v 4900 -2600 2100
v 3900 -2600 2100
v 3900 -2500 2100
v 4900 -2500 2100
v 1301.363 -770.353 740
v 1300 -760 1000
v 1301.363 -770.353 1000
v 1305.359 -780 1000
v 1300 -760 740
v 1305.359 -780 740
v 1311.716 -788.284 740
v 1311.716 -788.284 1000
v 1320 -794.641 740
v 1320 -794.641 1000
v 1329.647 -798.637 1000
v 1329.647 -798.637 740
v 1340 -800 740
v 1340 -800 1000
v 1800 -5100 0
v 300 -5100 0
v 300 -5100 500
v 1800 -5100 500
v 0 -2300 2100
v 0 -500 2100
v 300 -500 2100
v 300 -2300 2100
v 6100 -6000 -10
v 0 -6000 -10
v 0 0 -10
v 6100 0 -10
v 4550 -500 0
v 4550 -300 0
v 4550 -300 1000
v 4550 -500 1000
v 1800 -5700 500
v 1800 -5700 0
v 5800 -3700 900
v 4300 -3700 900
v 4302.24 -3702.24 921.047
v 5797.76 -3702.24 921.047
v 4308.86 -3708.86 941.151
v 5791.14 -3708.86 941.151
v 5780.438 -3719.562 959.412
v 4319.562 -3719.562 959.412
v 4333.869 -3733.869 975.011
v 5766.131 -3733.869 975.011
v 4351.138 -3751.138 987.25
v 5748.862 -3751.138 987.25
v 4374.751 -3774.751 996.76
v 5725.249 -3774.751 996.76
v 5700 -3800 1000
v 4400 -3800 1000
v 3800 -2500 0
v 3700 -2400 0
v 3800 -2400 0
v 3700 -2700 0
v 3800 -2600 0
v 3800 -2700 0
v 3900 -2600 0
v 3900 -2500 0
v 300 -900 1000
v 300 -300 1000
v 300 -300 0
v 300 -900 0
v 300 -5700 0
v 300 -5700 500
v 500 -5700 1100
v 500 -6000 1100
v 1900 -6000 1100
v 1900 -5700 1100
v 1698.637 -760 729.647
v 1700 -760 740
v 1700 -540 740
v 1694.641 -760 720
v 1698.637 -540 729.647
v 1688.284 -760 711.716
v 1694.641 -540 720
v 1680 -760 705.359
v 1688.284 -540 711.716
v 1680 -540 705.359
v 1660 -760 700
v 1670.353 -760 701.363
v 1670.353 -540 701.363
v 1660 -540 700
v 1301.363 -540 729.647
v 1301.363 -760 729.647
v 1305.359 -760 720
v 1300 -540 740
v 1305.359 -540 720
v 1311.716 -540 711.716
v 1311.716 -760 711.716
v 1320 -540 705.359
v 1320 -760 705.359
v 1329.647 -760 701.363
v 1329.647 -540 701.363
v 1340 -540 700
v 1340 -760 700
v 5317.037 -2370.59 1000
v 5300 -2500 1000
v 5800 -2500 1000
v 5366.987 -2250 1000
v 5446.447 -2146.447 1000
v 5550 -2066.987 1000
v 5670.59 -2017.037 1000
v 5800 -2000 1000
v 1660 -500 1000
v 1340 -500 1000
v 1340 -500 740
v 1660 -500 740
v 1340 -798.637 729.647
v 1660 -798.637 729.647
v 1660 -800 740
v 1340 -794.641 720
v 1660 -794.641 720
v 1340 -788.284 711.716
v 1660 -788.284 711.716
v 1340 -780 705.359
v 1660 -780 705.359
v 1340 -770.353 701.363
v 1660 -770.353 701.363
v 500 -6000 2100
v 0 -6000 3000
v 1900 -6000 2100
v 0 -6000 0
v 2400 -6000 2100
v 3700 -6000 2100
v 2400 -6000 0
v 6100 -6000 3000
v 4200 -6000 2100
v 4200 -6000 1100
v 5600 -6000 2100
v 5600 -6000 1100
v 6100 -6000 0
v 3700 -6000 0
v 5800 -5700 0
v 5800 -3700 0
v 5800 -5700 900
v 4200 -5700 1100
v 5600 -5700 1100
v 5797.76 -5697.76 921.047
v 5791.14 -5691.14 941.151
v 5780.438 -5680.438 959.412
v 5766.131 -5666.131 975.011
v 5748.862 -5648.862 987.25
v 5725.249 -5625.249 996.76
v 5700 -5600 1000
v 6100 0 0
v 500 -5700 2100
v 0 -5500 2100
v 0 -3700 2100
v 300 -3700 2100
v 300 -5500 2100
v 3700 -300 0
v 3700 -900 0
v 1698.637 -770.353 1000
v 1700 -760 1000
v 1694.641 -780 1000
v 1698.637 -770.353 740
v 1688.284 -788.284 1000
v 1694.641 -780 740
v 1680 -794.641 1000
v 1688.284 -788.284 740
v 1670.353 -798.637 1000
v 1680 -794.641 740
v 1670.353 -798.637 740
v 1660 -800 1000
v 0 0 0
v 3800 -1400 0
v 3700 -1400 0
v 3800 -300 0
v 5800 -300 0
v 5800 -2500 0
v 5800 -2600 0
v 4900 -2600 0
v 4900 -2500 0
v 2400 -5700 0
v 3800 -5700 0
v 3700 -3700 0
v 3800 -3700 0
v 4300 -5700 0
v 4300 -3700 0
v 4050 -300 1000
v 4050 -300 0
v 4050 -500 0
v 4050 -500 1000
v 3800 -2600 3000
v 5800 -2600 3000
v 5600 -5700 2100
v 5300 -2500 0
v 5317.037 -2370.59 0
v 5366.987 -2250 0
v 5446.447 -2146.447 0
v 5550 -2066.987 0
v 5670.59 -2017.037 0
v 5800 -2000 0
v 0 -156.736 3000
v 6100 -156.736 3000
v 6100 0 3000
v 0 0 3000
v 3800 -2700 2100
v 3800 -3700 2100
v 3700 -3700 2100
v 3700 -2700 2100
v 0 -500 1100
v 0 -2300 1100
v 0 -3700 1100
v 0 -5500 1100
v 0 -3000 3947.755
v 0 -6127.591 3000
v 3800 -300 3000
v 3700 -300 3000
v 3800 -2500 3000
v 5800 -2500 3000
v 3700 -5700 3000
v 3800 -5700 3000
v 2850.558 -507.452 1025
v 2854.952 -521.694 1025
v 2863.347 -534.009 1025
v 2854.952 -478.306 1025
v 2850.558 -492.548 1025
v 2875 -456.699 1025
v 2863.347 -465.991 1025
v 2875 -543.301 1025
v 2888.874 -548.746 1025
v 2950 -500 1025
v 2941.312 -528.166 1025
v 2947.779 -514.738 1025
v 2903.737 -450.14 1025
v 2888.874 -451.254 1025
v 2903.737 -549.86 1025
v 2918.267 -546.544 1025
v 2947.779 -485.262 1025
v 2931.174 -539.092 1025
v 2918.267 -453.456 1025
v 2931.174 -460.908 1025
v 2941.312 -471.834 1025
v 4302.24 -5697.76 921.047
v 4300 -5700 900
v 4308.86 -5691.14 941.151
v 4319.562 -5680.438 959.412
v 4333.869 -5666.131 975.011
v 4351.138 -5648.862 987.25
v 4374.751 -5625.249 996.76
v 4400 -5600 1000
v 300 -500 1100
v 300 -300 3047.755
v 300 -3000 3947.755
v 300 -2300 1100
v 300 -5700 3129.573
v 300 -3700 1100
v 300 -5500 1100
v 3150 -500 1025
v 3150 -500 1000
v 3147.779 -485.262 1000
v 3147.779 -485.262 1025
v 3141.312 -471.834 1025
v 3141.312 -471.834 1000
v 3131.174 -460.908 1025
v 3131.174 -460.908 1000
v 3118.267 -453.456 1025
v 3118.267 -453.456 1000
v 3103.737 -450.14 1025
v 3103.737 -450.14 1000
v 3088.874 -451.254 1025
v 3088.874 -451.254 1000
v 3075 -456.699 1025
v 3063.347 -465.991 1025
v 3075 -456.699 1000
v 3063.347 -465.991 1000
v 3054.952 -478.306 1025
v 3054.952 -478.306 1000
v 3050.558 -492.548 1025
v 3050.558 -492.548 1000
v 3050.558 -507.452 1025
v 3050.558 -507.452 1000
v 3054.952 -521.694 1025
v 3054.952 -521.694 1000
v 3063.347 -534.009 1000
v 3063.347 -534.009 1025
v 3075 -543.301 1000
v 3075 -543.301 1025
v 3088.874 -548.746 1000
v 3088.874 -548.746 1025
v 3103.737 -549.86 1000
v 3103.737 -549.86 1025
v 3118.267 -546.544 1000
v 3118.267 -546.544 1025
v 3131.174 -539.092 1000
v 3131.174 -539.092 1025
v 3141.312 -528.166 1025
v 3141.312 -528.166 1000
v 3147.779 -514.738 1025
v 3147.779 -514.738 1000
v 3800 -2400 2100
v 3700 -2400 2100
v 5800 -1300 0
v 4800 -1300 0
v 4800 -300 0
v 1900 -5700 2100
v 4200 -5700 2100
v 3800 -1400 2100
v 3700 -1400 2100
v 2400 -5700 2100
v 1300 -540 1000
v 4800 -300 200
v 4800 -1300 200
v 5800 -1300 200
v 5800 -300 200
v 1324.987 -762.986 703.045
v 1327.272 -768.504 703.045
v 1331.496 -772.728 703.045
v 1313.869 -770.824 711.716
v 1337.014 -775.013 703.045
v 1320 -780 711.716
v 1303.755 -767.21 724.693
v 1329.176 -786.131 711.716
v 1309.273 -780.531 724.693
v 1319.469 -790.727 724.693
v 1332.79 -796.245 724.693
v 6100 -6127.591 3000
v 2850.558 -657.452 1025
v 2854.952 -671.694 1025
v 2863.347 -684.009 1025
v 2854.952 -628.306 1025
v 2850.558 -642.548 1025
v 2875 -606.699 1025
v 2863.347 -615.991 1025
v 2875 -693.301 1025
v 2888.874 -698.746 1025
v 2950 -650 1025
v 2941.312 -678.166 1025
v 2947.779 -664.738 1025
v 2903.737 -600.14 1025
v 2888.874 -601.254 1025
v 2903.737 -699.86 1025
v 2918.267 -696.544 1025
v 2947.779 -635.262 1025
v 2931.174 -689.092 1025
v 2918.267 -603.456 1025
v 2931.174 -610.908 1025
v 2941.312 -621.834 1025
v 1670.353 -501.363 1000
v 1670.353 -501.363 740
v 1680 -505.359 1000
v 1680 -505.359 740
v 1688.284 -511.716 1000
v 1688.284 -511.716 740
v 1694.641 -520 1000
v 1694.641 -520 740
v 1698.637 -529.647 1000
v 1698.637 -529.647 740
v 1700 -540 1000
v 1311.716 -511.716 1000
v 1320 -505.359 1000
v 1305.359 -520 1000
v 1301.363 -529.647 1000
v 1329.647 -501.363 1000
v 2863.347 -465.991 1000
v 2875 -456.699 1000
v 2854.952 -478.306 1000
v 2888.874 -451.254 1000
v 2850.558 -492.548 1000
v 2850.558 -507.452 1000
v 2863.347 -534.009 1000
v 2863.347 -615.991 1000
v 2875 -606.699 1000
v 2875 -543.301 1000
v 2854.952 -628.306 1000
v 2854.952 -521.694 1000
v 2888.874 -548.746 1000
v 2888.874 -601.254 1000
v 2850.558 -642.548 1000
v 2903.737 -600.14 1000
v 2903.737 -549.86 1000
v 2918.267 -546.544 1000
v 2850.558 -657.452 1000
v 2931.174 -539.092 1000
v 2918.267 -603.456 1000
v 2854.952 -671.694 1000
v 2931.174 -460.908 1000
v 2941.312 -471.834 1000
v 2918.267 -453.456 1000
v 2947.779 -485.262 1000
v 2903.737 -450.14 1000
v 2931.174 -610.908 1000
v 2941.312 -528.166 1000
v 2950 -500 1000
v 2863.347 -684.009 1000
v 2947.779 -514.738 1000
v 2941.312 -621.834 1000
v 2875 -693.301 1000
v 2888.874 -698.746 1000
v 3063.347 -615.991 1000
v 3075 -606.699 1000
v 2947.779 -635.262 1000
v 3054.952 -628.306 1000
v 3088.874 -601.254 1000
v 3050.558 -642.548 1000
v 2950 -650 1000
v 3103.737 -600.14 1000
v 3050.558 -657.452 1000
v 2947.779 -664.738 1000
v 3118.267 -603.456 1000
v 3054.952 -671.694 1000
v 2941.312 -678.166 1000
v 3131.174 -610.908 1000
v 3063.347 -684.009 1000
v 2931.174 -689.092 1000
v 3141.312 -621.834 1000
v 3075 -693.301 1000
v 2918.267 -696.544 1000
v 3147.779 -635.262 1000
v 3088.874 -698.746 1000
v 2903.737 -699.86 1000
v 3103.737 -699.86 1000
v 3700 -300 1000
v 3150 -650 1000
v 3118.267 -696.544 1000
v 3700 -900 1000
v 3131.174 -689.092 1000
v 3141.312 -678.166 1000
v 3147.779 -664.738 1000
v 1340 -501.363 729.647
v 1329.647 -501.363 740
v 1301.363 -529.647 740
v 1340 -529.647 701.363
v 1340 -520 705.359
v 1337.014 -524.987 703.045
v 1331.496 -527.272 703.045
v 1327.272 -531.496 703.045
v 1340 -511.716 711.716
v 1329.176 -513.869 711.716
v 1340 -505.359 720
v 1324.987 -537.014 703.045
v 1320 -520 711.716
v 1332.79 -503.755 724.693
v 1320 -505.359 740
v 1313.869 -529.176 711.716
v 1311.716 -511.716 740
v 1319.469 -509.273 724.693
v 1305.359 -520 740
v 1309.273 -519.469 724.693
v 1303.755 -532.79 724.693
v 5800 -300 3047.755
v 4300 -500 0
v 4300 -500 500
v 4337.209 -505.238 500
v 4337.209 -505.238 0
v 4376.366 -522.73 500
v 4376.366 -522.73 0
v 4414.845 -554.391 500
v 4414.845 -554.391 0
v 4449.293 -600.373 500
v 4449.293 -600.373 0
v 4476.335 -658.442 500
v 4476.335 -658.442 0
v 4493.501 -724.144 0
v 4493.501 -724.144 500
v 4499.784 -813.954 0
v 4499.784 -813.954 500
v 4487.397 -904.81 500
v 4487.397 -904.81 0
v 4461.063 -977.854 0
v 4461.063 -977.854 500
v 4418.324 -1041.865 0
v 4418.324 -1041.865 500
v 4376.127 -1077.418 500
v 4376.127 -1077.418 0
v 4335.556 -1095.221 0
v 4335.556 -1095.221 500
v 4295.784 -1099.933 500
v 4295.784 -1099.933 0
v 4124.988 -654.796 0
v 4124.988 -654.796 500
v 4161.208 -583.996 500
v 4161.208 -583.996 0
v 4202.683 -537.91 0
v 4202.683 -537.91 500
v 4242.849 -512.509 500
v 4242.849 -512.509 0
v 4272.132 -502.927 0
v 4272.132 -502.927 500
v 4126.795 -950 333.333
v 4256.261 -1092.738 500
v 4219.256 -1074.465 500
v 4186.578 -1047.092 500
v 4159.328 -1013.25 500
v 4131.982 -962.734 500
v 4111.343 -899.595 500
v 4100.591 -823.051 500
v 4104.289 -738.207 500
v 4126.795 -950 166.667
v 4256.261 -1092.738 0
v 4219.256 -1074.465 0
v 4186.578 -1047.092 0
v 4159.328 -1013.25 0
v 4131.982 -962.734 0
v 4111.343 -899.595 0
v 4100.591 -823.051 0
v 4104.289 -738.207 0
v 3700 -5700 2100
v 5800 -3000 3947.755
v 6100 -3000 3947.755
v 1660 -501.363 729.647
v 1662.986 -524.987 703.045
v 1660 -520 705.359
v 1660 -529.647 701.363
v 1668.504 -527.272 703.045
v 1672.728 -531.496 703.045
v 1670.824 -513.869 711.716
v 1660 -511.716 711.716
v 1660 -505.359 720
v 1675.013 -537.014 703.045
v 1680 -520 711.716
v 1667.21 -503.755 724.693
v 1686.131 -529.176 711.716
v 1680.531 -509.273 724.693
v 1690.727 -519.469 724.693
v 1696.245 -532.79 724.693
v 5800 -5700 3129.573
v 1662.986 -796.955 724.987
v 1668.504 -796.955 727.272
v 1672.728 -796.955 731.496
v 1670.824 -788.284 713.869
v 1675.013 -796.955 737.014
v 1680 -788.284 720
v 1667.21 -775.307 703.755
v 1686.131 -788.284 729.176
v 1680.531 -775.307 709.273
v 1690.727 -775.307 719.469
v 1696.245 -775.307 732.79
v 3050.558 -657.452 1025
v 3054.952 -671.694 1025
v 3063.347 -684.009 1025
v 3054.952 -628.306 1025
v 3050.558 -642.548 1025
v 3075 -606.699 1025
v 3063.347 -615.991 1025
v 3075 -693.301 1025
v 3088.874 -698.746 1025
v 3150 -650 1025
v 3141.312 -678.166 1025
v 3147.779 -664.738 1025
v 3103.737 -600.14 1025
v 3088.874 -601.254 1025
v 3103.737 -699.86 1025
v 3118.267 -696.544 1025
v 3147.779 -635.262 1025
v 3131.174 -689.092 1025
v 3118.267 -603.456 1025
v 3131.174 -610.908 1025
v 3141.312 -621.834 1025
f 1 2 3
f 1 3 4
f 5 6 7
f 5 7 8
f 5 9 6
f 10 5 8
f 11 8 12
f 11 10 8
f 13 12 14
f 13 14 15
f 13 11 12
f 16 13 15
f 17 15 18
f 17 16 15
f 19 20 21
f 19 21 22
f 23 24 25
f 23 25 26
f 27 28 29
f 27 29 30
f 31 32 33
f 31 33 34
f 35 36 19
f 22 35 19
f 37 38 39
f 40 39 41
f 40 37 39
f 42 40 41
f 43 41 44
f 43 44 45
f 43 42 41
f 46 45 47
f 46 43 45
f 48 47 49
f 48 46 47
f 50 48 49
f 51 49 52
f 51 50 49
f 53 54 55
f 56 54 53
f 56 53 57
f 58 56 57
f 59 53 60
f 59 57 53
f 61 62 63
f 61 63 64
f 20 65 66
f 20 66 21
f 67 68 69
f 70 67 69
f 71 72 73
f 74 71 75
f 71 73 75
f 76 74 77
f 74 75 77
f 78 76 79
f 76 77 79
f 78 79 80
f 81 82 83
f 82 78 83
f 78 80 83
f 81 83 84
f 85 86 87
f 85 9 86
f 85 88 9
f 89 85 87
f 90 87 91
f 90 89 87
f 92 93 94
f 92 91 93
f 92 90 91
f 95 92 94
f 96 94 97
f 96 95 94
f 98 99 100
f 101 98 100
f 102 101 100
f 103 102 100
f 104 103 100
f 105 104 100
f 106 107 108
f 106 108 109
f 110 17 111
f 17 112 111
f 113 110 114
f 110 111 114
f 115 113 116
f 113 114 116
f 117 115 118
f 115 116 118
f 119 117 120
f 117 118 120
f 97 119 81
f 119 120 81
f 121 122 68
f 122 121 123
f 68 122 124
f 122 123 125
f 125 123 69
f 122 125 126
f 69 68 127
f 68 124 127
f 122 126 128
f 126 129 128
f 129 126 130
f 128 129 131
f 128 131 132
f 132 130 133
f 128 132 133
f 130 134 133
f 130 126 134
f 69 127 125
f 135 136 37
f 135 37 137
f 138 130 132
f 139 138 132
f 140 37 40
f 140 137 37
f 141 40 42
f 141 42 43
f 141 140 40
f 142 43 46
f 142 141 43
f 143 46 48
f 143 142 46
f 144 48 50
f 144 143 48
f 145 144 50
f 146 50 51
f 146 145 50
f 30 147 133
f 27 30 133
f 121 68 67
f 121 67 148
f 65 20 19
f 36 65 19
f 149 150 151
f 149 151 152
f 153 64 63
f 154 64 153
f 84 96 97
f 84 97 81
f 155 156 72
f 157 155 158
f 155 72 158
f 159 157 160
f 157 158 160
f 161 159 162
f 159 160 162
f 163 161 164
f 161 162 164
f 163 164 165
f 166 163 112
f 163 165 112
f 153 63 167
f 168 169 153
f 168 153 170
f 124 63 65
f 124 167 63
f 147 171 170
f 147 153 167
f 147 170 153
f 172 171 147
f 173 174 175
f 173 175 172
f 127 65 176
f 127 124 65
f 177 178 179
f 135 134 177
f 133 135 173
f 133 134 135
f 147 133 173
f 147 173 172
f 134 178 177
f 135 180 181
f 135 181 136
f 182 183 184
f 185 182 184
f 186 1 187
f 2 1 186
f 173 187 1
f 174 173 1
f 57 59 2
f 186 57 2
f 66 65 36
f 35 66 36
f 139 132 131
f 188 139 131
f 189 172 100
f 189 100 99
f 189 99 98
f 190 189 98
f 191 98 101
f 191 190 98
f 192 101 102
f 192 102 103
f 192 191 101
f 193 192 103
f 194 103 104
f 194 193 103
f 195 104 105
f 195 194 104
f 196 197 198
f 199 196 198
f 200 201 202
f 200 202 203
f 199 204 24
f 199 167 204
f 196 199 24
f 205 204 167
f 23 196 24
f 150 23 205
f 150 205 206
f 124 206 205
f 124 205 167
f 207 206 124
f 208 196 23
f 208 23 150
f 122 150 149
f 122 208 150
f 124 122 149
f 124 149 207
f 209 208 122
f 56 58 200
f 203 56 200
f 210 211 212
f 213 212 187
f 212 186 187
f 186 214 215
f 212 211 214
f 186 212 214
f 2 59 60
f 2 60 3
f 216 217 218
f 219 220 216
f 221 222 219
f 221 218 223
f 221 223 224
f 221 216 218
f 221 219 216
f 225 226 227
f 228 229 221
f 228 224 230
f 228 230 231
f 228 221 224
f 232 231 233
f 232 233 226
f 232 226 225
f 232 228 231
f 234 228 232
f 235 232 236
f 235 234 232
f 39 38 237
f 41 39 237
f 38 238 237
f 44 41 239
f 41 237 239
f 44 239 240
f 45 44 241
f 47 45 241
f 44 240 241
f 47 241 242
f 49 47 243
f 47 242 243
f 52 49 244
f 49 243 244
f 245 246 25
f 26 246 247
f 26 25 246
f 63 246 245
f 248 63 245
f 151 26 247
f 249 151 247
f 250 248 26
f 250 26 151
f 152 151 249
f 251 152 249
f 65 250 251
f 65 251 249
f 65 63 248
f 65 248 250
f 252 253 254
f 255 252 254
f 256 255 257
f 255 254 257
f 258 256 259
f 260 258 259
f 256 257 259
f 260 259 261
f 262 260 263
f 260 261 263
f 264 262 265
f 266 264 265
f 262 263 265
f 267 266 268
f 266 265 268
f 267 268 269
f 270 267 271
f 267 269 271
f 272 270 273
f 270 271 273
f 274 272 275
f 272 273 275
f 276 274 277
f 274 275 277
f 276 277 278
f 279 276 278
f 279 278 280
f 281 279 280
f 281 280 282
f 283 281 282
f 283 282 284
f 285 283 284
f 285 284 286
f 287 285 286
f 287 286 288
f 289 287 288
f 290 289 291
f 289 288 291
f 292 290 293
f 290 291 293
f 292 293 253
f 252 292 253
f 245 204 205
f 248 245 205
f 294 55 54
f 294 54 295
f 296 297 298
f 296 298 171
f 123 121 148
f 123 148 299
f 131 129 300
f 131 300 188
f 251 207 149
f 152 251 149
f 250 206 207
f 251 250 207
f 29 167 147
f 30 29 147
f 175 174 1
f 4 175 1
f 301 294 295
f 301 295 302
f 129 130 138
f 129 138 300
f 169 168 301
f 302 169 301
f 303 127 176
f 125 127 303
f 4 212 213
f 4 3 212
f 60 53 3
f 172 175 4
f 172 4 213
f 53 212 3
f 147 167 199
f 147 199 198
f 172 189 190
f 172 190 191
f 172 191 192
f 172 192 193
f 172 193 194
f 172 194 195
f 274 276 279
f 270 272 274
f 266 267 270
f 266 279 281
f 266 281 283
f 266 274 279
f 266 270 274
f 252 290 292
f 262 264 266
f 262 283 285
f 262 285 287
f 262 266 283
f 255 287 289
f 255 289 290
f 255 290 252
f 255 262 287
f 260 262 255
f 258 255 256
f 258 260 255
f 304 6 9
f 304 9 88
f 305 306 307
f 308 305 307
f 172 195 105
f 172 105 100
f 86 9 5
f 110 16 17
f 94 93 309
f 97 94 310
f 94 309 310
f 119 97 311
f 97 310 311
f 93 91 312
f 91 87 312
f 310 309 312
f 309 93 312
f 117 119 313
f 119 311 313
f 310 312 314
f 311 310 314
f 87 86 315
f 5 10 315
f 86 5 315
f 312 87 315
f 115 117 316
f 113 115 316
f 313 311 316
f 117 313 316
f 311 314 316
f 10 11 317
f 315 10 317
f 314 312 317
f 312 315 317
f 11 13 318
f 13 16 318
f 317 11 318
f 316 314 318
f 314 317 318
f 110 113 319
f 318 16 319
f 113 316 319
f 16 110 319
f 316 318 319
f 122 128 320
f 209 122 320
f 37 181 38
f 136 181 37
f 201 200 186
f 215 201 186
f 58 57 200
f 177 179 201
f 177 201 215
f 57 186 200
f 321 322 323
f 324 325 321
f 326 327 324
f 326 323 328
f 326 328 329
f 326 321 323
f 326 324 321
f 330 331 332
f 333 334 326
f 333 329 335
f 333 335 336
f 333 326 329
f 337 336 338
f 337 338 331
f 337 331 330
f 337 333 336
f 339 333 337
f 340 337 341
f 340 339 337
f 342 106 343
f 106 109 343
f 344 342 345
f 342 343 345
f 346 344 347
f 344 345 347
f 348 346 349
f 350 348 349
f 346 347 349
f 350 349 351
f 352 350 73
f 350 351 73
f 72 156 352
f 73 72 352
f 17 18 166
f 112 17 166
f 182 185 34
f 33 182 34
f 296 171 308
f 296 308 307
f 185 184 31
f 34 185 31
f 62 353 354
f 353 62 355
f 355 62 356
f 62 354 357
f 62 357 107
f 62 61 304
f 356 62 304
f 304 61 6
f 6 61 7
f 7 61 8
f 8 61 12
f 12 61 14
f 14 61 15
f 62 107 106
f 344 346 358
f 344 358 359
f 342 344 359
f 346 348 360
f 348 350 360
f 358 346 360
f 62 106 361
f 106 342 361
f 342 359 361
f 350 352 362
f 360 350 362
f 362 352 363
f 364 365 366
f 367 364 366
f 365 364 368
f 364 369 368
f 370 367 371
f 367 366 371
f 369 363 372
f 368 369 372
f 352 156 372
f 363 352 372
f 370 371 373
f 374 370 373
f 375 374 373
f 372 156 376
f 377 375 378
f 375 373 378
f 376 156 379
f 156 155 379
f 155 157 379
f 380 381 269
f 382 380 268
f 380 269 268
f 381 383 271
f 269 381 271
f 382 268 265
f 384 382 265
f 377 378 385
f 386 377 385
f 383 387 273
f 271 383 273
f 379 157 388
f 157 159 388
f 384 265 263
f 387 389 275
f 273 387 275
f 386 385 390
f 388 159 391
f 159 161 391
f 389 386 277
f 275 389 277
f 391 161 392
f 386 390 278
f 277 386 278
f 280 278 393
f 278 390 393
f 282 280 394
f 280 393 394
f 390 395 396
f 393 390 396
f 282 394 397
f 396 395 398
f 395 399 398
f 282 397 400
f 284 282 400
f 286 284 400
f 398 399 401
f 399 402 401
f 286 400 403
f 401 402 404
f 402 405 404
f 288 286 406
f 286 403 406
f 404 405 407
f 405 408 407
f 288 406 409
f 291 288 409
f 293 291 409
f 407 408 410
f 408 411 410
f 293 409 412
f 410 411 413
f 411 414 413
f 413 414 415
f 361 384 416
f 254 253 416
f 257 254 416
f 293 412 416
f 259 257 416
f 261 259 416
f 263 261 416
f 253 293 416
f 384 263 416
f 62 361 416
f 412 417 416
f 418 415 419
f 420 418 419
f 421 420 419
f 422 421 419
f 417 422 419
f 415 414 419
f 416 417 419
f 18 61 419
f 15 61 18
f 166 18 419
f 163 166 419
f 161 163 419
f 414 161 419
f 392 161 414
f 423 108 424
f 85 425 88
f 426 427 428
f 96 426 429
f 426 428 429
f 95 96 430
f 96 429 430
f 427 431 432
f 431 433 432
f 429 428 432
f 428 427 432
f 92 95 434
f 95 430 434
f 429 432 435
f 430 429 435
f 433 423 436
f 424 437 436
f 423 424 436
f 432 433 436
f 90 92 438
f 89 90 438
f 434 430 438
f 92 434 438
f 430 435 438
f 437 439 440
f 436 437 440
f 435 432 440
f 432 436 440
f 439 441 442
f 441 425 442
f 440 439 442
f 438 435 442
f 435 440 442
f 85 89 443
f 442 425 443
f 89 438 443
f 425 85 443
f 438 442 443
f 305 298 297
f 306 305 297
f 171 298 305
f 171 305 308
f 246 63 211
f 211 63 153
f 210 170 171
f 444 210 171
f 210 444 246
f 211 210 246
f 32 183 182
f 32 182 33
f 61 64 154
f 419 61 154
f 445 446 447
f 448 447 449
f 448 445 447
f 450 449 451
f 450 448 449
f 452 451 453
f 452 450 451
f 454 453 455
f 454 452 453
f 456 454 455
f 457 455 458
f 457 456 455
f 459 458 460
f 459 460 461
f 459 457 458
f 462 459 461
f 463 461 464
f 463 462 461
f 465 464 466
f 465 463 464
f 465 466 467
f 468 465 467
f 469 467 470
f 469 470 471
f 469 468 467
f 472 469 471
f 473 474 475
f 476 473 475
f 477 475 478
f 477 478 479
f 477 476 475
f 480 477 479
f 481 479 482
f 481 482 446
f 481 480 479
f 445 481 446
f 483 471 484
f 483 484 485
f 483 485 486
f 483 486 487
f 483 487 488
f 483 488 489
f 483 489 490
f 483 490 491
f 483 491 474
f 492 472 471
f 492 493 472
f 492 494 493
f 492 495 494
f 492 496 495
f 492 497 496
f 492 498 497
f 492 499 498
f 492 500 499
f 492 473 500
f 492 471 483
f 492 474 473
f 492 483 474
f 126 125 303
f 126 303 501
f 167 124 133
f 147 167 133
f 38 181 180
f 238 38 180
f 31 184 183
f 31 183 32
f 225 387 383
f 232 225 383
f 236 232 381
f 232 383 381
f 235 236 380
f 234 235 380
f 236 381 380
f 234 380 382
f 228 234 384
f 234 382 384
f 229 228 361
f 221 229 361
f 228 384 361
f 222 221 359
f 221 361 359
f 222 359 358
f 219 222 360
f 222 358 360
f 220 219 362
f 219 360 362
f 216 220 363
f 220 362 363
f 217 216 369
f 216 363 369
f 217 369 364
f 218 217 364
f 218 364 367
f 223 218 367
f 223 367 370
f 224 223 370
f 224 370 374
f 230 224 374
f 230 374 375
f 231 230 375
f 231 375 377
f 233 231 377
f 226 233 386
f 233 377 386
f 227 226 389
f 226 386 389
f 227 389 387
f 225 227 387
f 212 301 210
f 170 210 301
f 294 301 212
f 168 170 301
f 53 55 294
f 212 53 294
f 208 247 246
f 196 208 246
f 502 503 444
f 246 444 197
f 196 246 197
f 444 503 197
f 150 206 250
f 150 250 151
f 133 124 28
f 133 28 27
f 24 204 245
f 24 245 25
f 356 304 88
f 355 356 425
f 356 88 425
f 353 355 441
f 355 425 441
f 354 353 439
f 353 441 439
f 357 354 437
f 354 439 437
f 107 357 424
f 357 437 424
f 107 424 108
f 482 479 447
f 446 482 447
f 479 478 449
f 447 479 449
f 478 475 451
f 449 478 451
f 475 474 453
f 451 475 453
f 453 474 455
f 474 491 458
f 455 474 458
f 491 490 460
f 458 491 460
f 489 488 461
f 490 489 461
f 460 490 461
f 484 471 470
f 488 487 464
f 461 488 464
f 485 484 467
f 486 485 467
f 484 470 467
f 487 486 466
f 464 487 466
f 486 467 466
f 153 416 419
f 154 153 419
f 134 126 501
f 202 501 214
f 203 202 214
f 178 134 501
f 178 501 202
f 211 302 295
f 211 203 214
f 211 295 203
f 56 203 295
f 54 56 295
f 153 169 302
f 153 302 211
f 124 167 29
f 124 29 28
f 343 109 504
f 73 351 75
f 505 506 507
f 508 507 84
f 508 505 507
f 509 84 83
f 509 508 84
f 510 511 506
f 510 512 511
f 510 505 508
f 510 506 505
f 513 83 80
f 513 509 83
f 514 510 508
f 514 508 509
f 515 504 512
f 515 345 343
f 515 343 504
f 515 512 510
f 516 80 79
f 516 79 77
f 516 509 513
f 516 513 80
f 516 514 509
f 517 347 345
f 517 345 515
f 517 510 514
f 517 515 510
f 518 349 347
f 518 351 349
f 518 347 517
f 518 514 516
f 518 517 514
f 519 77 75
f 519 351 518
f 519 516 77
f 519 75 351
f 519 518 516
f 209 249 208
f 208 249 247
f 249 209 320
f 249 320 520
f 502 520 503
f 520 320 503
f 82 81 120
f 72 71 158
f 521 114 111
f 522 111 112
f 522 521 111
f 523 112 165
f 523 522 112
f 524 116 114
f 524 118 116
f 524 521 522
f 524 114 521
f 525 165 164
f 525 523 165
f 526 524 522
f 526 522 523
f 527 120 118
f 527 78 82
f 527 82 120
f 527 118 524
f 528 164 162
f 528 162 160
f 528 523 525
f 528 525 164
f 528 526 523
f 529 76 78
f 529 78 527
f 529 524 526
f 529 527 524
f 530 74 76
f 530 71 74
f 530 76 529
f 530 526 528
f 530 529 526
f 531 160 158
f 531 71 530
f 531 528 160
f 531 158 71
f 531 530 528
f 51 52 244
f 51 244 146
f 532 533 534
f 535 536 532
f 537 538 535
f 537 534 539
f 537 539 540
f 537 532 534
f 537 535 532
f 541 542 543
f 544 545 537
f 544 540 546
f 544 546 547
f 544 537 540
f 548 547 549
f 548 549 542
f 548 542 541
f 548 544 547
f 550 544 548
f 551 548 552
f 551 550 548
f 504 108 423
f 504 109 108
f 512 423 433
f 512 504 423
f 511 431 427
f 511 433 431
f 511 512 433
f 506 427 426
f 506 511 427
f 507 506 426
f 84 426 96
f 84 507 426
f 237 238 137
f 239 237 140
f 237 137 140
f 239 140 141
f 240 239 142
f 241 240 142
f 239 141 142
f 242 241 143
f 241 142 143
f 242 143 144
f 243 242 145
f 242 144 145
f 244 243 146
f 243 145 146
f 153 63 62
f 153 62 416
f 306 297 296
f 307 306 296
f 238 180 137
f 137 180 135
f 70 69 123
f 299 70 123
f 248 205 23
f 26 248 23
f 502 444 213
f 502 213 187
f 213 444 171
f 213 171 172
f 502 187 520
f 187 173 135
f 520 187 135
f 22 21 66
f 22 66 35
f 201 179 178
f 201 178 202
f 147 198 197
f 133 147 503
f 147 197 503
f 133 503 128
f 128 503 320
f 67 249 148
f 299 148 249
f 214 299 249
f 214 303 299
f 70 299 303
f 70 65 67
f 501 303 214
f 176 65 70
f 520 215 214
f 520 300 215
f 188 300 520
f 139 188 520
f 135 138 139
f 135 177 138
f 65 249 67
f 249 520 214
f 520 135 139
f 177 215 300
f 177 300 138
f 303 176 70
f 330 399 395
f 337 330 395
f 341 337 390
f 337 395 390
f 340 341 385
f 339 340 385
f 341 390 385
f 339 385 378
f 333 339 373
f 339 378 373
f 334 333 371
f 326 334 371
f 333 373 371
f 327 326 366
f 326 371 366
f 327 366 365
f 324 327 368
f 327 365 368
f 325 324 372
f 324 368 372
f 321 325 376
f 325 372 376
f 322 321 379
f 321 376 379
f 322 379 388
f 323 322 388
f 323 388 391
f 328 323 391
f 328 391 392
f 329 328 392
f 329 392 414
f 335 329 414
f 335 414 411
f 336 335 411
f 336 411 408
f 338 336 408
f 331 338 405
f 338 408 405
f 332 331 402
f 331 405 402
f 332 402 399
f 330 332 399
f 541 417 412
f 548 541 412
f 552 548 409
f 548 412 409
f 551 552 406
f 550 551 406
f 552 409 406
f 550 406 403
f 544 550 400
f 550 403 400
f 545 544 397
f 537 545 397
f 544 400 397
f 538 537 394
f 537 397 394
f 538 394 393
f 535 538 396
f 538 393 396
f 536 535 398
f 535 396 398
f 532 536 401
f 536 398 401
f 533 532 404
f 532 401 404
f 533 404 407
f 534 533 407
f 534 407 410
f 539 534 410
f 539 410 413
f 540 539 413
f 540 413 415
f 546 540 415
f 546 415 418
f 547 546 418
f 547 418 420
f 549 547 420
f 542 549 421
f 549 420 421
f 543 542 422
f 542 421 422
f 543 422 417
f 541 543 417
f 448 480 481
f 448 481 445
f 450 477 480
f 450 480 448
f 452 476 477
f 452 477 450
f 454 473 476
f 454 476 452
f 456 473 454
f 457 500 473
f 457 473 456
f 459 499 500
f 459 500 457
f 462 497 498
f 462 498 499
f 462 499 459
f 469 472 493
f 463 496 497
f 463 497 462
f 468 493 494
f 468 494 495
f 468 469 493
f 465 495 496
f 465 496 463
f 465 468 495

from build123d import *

# Parameters (mm, degrees)
F0_W      = 6100
F0_H      = 6000
F1_DEPTH  = 3000
F3_DEPTH  = 6100
F5_DEPTH  = 6100
F6_W      = 5500
F6_H      = 5400
F7_DEPTH  = 3947.755728
F8_W      = 1300
F8_H      = 2100
F8_W_2    = 1400
F8_H_2    = 1000
F9_DEPTH  = 1000
F10_W     = 1500
F10_H     = 2000
F11_DEPTH = 1000
F12_W     = 1000
F12_H     = 1000
F13_DEPTH = 200
F15_DEPTH = 3000
F16_W     = 1800
F16_H     = 1000
F17_DEPTH = 1000
F19_DEPTH = 500
F20_W     = 500
F20_H     = 200
F21_DEPTH = 1000
F23_DEPTH = 1000
F24_W     = 1000
F24_H     = 2100
F25_DEPTH = 500
F26_W     = 3400
F26_H     = 600
F27_DEPTH = 1000
F28_W     = 400
F28_H     = 300
F29_DEPTH = 300
F30_W     = 1000
F30_H     = 2100
F31_DEPTH = 500
F32_R     = 40
F33_R     = 100
F34_W     = 6100
F34_H     = 6000
F35_DEPTH = 10
F36_R     = 50
F37_DEPTH = 25
F38_W     = 1500
F38_H     = 600
F39_DEPTH = 500


with BuildPart() as f1:
    # F0 (on Top) → F1 (new body)
    with BuildSketch(Plane.XY):
        with Locations((3050, -3000)):
            Rectangle(F0_W, F0_H)
    extrude(amount=F1_DEPTH)

    # F2 (on face) → F3 (join)
    with BuildSketch(Plane(origin=(0, 0, 0), x_dir=(0, -1, 0), z_dir=(-1, 0, 0))):
        Polygon((3000, 4000), (0, 3000), (6300, 3000), align=None)
    extrude(amount=-F3_DEPTH)

    # F4 (on face) → F5 (cut)
    with BuildSketch(Plane.YZ.offset(6100)):
        Polygon((-3000, 4000), (-6300, 3000), (-6127.590604, 3000), (-3000, 3947.754728), (-156.735815, 3000), (0, 3000), align=None)
    extrude(amount=-F5_DEPTH, mode=Mode.SUBTRACT)

    # F6 (on face) → F7 (cut, through all)
    with BuildSketch(Plane(origin=(0, 0, 0), x_dir=(1, 0, 0), z_dir=(0, 0, -1))):
        with Locations((3050, 3000)):
            Rectangle(F6_W, F6_H)
    extrude(amount=-F7_DEPTH, mode=Mode.SUBTRACT)

    # F8 (on face) → F9 (cut)
    with BuildSketch(Plane.XZ.offset(6000)):
        with Locations((3050, 1050)):
            Rectangle(F8_W, F8_H)
        with Locations((4900, 1600)):
            Rectangle(F8_W_2, F8_H_2)
        with Locations((1200, 1600)):
            Rectangle(F8_W_2, F8_H_2)
    extrude(amount=-F9_DEPTH, mode=Mode.SUBTRACT)

    # F14 (on face) → F15 (join)
    with BuildSketch(Plane(origin=(0, 0, 0), x_dir=(1, 0, 0), z_dir=(0, 0, -1))):
        Polygon((3800, 5700), (3700, 5700), (3700, 300), (3800, 300), (3800, 2500), (5800, 2500), (5800, 2600), (3800, 2600), align=None)
    extrude(amount=-F15_DEPTH)

    # F16 (on face) → F17 (cut)
    with BuildSketch(Plane(origin=(0, 0, 0), x_dir=(0, -1, 0), z_dir=(-1, 0, 0))):
        with Locations((4600, 1600)):
            Rectangle(F16_W, F16_H)
        with Locations((1400, 1600)):
            Rectangle(F16_W, F16_H)
    extrude(amount=-F17_DEPTH, mode=Mode.SUBTRACT)

    # F24 (on face) → F25 (cut)
    with BuildSketch(Plane.YZ.offset(3800)):
        with Locations((-1900, 1050)):
            Rectangle(F24_W, F24_H)
        with Locations((-3200, 1050)):
            Rectangle(F24_W, F24_H)
    extrude(amount=-F25_DEPTH, mode=Mode.SUBTRACT)

    # F30 (on face) → F31 (cut)
    with BuildSketch(Plane.XZ.offset(2600)):
        with Locations((4400, 1050)):
            Rectangle(F30_W, F30_H)
    extrude(amount=-F31_DEPTH, mode=Mode.SUBTRACT)


with BuildPart() as f11:
    # F10 (on face) → F11 (new body)
    with BuildSketch(Plane(origin=(0, 0, 0), x_dir=(1, 0, 0), z_dir=(0, 0, -1))):
        with Locations((5050, 4700)):
            Rectangle(F10_W, F10_H)
    extrude(amount=-F11_DEPTH)

    # F33
    f33_edges = [f11.edges().sort_by_distance(p)[0] for p in [
        (5800, -4700, 1000),
        (5050, -5700, 1000),
        (4300, -4700, 1000),
        (5050, -3700, 1000),
    ]]
    fillet(f33_edges, radius=F33_R)


with BuildPart() as f13:
    # F12 (on face) → F13 (new body)
    with BuildSketch(Plane(origin=(0, 0, 0), x_dir=(1, 0, 0), z_dir=(0, 0, -1))):
        with Locations((5300, 800)):
            Rectangle(F12_W, F12_H)
    extrude(amount=-F13_DEPTH)


with BuildPart() as f19:
    # F18 (on face) → F19 (new body)
    with BuildSketch(Plane(origin=(0, 0, 0), x_dir=(1, 0, 0), z_dir=(0, 0, -1))):
        with BuildLine():
            add(Edge.make_bspline(
                [(4300, 500), (4646.410162, 500), (4473.205081, 950), (4300, 1400), (4126.794919, 950), (3953.589838, 500), (4300, 500)],
                knots=[0, 0, 0, 2.094395, 2.094395, 4.18879, 4.18879, 6.283185, 6.283185, 6.283185], degree=2, weights=[1, 0.5, 1, 0.5, 1, 0.5, 1]))
        make_face()
    extrude(amount=-F19_DEPTH)


with BuildPart() as f21:
    # F20 (on face) → F21 (new body)
    with BuildSketch(Plane(origin=(0, 0, 0), x_dir=(1, 0, 0), z_dir=(0, 0, -1))):
        with Locations((4300, 400)):
            Rectangle(F20_W, F20_H)
    extrude(amount=-F21_DEPTH)


with BuildPart() as f23:
    # F22 (on face) → F23 (new body)
    with BuildSketch(Plane(origin=(0, 0, 0), x_dir=(1, 0, 0), z_dir=(0, 0, -1))):
        with BuildLine():
            Line((5800, 2000), (5800, 2500))
            Line((5800, 2500), (5300, 2500))
            ThreePointArc((5300, 2500), (5446.446609, 2146.446609), (5800, 2000))
        make_face()
    extrude(amount=-F23_DEPTH)


with BuildPart() as f27:
    # F26 (on face) → F27 (new body)
    with BuildSketch(Plane(origin=(0, 0, 0), x_dir=(1, 0, 0), z_dir=(0, 0, -1))):
        with Locations((2000, 600)):
            Rectangle(F26_W, F26_H)
    extrude(amount=-F27_DEPTH)

    # F28 (on face) → F29 (cut)
    with BuildSketch(Plane.XY.offset(1000)):
        with Locations((1500, -650)):
            Rectangle(F28_W, F28_H)
    extrude(amount=-F29_DEPTH, mode=Mode.SUBTRACT)

    # F32
    f32_edges = [f27.edges().sort_by_distance(p)[0] for p in [
        (1700, -500, 850),
        (1300, -500, 850),
        (1300, -800, 850),
        (1500, -500, 700),
        (1700, -650, 700),
        (1300, -650, 700),
        (1500, -800, 700),
        (1700, -800, 850),
    ]]
    fillet(f32_edges, radius=F32_R)

    # F36 (on face) → F37 (join)
    with BuildSketch(Plane.XY.offset(1000)):
        with Locations((2900, -650)):
            Circle(F36_R)
        with Locations((3100, -650)):
            Circle(F36_R)
        with Locations((3100, -500)):
            Circle(F36_R)
        with Locations((2900, -500)):
            Circle(F36_R)
    extrude(amount=F37_DEPTH)


with BuildPart() as f35:
    # F34 (on face) → F35 (new body)
    with BuildSketch(Plane(origin=(0, 0, 0), x_dir=(1, 0, 0), z_dir=(0, 0, -1))):
        with Locations((3050, 3000)):
            Rectangle(F34_W, F34_H)
    extrude(amount=F35_DEPTH)


with BuildPart() as f39:
    # F38 (on face) → F39 (new body)
    with BuildSketch(Plane.XY):
        with Locations((1050, -5400)):
            Rectangle(F38_W, F38_H)
    extrude(amount=F39_DEPTH)


solid = Compound([f1.part, f11.part, f13.part, f19.part, f21.part, f23.part, f27.part, f35.part, f39.part])
